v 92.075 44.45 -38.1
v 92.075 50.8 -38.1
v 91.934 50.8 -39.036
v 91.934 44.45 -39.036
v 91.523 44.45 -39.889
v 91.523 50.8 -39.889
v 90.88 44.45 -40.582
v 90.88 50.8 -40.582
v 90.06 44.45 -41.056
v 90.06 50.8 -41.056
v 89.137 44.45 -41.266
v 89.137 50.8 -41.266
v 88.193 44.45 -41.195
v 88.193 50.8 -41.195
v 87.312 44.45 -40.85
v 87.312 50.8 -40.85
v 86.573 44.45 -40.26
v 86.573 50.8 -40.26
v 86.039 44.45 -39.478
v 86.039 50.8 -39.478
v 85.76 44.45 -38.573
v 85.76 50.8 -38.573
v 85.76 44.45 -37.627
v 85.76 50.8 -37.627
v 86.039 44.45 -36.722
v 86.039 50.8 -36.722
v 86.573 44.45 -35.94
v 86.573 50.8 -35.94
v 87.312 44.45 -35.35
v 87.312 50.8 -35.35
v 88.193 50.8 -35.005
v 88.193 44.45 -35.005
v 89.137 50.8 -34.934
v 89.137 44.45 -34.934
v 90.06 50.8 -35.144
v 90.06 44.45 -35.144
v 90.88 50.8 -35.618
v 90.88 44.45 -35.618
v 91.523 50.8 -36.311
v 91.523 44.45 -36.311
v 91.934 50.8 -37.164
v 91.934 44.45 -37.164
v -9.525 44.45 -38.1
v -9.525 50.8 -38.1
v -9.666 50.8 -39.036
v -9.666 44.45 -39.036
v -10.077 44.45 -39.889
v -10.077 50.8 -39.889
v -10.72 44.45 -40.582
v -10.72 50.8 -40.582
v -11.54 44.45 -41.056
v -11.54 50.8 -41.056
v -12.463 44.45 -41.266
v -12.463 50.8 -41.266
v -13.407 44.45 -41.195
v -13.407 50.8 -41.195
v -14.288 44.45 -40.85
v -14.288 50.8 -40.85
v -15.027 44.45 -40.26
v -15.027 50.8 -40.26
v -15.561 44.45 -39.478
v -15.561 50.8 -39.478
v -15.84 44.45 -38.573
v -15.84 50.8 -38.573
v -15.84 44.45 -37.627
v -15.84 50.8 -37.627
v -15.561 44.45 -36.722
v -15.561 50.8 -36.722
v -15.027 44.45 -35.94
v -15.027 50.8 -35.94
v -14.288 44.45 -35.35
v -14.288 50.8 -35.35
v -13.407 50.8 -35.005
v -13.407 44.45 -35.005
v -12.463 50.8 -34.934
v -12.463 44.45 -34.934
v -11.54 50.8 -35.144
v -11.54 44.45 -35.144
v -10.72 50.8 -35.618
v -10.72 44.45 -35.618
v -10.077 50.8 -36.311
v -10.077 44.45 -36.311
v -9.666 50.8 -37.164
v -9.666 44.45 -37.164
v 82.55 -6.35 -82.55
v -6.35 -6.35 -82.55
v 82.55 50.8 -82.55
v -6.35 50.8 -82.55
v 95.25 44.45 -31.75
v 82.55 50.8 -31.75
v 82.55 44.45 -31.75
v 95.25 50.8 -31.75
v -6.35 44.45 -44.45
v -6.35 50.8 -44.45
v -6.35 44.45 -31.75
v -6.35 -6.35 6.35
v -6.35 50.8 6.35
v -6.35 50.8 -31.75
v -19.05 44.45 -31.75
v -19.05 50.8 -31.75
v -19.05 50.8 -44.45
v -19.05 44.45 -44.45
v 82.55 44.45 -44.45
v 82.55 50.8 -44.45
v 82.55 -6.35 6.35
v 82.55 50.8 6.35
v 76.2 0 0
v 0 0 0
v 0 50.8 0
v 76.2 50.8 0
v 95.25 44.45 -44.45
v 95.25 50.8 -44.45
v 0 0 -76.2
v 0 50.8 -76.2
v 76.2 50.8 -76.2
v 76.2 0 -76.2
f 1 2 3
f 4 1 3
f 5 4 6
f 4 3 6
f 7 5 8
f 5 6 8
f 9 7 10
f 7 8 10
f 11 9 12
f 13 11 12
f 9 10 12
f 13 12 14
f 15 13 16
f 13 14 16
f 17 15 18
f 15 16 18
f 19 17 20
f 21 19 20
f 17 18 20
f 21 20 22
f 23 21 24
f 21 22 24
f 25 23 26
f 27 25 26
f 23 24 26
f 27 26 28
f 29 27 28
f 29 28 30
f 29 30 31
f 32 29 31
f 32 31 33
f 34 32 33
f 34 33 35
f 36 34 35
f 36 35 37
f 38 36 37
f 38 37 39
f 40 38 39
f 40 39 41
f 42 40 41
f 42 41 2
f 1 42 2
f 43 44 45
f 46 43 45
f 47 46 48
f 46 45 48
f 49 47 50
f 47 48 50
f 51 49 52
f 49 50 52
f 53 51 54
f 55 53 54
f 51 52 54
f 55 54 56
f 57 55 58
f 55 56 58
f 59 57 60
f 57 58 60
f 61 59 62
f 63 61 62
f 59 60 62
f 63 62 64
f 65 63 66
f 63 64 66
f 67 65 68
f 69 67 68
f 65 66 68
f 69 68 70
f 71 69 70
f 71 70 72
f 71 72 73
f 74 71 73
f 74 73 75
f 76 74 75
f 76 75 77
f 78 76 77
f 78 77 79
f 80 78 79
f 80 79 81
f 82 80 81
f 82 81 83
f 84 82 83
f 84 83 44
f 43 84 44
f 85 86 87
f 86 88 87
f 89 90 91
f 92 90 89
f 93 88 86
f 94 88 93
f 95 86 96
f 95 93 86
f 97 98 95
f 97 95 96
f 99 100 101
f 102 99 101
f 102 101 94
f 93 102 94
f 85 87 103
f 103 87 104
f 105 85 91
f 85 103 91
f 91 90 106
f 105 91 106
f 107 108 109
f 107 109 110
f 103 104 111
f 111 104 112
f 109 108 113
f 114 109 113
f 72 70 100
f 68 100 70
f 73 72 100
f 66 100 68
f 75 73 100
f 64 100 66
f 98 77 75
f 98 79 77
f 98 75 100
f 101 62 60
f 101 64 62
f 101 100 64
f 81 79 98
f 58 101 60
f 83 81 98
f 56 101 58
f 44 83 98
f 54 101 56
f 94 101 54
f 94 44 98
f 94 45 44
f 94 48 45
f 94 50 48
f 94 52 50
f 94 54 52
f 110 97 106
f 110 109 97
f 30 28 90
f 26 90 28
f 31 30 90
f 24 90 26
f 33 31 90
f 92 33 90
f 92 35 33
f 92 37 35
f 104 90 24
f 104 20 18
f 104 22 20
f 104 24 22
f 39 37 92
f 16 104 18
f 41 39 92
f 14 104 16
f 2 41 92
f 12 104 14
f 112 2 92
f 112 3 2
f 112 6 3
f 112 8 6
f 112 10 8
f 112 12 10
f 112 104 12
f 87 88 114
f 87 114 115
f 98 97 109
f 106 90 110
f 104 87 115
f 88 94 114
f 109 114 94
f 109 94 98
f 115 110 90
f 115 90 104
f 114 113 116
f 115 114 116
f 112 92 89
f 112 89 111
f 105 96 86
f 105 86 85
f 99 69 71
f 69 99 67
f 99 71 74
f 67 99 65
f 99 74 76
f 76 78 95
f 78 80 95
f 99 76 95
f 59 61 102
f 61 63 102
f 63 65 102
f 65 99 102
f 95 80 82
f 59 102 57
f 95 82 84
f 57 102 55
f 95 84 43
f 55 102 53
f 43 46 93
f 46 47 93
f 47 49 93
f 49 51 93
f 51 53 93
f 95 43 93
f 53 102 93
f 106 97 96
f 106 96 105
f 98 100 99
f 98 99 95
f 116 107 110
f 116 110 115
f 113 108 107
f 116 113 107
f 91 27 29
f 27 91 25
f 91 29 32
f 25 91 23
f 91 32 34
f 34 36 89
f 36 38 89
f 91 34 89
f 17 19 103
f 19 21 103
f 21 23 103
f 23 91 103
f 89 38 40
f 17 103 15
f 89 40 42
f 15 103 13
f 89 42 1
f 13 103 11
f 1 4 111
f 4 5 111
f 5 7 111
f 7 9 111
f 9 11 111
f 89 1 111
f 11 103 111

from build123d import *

# Parameters (mm, degrees)
SKETCH1_W           = 88.9
SKETCH1_H           = 88.9
SKETCH1_W_2         = 76.2
SKETCH1_H_2         = 76.2
BOSS_EXTRUDE1_DEPTH = 50.8
SKETCH2_W           = 88.9
SKETCH2_H           = 88.9
BOSS_EXTRUDE2_DEPTH = 6.35
SKETCH3_W           = 12.7
SKETCH3_H           = 12.7
BOSS_EXTRUDE3_DEPTH = 6.35
SKETCH4_R           = 3.175
CUT_EXTRUDE1_DEPTH  = 58.15


with BuildPart() as part:
    # Sketch1 → Boss-Extrude1 (new body)
    with BuildSketch(Plane(origin=(0, 0, 0), x_dir=(1, 0, 0), z_dir=(0, 1, 0))):
        with Locations((38.1, 38.1)):
            Rectangle(SKETCH1_W, SKETCH1_H)
        with Locations((38.1, 38.1)):
            Rectangle(SKETCH1_W_2, SKETCH1_H_2, mode=Mode.SUBTRACT)
    extrude(amount=BOSS_EXTRUDE1_DEPTH)

    # Sketch2 → Boss-Extrude2 (add)
    with BuildSketch(Plane.XZ):
        with Locations((38.1, -38.1)):
            Rectangle(SKETCH2_W, SKETCH2_H)
    extrude(amount=BOSS_EXTRUDE2_DEPTH)

    # Sketch3 → Boss-Extrude3 (add)
    with BuildSketch(Plane(origin=(0, 50.8, 0), x_dir=(1, 0, 0), z_dir=(0, 1, 0))):
        with Locations((88.9, 38.1)):
            Rectangle(SKETCH3_W, SKETCH3_H)
        with Locations((-12.7, 38.1)):
            Rectangle(SKETCH3_W, SKETCH3_H)
    extrude(amount=-BOSS_EXTRUDE3_DEPTH)

    # Sketch4 → Cut-Extrude1 (cut, through all)
    with BuildSketch(Plane(origin=(0, 50.8, 0), x_dir=(1, 0, 0), z_dir=(0, 1, 0))):
        with Locations((88.9, 38.1)):
            Circle(SKETCH4_R)
        with Locations((-12.7, 38.1)):
            Circle(SKETCH4_R)
    extrude(amount=-CUT_EXTRUDE1_DEPTH, mode=Mode.SUBTRACT)


solid = part.part
